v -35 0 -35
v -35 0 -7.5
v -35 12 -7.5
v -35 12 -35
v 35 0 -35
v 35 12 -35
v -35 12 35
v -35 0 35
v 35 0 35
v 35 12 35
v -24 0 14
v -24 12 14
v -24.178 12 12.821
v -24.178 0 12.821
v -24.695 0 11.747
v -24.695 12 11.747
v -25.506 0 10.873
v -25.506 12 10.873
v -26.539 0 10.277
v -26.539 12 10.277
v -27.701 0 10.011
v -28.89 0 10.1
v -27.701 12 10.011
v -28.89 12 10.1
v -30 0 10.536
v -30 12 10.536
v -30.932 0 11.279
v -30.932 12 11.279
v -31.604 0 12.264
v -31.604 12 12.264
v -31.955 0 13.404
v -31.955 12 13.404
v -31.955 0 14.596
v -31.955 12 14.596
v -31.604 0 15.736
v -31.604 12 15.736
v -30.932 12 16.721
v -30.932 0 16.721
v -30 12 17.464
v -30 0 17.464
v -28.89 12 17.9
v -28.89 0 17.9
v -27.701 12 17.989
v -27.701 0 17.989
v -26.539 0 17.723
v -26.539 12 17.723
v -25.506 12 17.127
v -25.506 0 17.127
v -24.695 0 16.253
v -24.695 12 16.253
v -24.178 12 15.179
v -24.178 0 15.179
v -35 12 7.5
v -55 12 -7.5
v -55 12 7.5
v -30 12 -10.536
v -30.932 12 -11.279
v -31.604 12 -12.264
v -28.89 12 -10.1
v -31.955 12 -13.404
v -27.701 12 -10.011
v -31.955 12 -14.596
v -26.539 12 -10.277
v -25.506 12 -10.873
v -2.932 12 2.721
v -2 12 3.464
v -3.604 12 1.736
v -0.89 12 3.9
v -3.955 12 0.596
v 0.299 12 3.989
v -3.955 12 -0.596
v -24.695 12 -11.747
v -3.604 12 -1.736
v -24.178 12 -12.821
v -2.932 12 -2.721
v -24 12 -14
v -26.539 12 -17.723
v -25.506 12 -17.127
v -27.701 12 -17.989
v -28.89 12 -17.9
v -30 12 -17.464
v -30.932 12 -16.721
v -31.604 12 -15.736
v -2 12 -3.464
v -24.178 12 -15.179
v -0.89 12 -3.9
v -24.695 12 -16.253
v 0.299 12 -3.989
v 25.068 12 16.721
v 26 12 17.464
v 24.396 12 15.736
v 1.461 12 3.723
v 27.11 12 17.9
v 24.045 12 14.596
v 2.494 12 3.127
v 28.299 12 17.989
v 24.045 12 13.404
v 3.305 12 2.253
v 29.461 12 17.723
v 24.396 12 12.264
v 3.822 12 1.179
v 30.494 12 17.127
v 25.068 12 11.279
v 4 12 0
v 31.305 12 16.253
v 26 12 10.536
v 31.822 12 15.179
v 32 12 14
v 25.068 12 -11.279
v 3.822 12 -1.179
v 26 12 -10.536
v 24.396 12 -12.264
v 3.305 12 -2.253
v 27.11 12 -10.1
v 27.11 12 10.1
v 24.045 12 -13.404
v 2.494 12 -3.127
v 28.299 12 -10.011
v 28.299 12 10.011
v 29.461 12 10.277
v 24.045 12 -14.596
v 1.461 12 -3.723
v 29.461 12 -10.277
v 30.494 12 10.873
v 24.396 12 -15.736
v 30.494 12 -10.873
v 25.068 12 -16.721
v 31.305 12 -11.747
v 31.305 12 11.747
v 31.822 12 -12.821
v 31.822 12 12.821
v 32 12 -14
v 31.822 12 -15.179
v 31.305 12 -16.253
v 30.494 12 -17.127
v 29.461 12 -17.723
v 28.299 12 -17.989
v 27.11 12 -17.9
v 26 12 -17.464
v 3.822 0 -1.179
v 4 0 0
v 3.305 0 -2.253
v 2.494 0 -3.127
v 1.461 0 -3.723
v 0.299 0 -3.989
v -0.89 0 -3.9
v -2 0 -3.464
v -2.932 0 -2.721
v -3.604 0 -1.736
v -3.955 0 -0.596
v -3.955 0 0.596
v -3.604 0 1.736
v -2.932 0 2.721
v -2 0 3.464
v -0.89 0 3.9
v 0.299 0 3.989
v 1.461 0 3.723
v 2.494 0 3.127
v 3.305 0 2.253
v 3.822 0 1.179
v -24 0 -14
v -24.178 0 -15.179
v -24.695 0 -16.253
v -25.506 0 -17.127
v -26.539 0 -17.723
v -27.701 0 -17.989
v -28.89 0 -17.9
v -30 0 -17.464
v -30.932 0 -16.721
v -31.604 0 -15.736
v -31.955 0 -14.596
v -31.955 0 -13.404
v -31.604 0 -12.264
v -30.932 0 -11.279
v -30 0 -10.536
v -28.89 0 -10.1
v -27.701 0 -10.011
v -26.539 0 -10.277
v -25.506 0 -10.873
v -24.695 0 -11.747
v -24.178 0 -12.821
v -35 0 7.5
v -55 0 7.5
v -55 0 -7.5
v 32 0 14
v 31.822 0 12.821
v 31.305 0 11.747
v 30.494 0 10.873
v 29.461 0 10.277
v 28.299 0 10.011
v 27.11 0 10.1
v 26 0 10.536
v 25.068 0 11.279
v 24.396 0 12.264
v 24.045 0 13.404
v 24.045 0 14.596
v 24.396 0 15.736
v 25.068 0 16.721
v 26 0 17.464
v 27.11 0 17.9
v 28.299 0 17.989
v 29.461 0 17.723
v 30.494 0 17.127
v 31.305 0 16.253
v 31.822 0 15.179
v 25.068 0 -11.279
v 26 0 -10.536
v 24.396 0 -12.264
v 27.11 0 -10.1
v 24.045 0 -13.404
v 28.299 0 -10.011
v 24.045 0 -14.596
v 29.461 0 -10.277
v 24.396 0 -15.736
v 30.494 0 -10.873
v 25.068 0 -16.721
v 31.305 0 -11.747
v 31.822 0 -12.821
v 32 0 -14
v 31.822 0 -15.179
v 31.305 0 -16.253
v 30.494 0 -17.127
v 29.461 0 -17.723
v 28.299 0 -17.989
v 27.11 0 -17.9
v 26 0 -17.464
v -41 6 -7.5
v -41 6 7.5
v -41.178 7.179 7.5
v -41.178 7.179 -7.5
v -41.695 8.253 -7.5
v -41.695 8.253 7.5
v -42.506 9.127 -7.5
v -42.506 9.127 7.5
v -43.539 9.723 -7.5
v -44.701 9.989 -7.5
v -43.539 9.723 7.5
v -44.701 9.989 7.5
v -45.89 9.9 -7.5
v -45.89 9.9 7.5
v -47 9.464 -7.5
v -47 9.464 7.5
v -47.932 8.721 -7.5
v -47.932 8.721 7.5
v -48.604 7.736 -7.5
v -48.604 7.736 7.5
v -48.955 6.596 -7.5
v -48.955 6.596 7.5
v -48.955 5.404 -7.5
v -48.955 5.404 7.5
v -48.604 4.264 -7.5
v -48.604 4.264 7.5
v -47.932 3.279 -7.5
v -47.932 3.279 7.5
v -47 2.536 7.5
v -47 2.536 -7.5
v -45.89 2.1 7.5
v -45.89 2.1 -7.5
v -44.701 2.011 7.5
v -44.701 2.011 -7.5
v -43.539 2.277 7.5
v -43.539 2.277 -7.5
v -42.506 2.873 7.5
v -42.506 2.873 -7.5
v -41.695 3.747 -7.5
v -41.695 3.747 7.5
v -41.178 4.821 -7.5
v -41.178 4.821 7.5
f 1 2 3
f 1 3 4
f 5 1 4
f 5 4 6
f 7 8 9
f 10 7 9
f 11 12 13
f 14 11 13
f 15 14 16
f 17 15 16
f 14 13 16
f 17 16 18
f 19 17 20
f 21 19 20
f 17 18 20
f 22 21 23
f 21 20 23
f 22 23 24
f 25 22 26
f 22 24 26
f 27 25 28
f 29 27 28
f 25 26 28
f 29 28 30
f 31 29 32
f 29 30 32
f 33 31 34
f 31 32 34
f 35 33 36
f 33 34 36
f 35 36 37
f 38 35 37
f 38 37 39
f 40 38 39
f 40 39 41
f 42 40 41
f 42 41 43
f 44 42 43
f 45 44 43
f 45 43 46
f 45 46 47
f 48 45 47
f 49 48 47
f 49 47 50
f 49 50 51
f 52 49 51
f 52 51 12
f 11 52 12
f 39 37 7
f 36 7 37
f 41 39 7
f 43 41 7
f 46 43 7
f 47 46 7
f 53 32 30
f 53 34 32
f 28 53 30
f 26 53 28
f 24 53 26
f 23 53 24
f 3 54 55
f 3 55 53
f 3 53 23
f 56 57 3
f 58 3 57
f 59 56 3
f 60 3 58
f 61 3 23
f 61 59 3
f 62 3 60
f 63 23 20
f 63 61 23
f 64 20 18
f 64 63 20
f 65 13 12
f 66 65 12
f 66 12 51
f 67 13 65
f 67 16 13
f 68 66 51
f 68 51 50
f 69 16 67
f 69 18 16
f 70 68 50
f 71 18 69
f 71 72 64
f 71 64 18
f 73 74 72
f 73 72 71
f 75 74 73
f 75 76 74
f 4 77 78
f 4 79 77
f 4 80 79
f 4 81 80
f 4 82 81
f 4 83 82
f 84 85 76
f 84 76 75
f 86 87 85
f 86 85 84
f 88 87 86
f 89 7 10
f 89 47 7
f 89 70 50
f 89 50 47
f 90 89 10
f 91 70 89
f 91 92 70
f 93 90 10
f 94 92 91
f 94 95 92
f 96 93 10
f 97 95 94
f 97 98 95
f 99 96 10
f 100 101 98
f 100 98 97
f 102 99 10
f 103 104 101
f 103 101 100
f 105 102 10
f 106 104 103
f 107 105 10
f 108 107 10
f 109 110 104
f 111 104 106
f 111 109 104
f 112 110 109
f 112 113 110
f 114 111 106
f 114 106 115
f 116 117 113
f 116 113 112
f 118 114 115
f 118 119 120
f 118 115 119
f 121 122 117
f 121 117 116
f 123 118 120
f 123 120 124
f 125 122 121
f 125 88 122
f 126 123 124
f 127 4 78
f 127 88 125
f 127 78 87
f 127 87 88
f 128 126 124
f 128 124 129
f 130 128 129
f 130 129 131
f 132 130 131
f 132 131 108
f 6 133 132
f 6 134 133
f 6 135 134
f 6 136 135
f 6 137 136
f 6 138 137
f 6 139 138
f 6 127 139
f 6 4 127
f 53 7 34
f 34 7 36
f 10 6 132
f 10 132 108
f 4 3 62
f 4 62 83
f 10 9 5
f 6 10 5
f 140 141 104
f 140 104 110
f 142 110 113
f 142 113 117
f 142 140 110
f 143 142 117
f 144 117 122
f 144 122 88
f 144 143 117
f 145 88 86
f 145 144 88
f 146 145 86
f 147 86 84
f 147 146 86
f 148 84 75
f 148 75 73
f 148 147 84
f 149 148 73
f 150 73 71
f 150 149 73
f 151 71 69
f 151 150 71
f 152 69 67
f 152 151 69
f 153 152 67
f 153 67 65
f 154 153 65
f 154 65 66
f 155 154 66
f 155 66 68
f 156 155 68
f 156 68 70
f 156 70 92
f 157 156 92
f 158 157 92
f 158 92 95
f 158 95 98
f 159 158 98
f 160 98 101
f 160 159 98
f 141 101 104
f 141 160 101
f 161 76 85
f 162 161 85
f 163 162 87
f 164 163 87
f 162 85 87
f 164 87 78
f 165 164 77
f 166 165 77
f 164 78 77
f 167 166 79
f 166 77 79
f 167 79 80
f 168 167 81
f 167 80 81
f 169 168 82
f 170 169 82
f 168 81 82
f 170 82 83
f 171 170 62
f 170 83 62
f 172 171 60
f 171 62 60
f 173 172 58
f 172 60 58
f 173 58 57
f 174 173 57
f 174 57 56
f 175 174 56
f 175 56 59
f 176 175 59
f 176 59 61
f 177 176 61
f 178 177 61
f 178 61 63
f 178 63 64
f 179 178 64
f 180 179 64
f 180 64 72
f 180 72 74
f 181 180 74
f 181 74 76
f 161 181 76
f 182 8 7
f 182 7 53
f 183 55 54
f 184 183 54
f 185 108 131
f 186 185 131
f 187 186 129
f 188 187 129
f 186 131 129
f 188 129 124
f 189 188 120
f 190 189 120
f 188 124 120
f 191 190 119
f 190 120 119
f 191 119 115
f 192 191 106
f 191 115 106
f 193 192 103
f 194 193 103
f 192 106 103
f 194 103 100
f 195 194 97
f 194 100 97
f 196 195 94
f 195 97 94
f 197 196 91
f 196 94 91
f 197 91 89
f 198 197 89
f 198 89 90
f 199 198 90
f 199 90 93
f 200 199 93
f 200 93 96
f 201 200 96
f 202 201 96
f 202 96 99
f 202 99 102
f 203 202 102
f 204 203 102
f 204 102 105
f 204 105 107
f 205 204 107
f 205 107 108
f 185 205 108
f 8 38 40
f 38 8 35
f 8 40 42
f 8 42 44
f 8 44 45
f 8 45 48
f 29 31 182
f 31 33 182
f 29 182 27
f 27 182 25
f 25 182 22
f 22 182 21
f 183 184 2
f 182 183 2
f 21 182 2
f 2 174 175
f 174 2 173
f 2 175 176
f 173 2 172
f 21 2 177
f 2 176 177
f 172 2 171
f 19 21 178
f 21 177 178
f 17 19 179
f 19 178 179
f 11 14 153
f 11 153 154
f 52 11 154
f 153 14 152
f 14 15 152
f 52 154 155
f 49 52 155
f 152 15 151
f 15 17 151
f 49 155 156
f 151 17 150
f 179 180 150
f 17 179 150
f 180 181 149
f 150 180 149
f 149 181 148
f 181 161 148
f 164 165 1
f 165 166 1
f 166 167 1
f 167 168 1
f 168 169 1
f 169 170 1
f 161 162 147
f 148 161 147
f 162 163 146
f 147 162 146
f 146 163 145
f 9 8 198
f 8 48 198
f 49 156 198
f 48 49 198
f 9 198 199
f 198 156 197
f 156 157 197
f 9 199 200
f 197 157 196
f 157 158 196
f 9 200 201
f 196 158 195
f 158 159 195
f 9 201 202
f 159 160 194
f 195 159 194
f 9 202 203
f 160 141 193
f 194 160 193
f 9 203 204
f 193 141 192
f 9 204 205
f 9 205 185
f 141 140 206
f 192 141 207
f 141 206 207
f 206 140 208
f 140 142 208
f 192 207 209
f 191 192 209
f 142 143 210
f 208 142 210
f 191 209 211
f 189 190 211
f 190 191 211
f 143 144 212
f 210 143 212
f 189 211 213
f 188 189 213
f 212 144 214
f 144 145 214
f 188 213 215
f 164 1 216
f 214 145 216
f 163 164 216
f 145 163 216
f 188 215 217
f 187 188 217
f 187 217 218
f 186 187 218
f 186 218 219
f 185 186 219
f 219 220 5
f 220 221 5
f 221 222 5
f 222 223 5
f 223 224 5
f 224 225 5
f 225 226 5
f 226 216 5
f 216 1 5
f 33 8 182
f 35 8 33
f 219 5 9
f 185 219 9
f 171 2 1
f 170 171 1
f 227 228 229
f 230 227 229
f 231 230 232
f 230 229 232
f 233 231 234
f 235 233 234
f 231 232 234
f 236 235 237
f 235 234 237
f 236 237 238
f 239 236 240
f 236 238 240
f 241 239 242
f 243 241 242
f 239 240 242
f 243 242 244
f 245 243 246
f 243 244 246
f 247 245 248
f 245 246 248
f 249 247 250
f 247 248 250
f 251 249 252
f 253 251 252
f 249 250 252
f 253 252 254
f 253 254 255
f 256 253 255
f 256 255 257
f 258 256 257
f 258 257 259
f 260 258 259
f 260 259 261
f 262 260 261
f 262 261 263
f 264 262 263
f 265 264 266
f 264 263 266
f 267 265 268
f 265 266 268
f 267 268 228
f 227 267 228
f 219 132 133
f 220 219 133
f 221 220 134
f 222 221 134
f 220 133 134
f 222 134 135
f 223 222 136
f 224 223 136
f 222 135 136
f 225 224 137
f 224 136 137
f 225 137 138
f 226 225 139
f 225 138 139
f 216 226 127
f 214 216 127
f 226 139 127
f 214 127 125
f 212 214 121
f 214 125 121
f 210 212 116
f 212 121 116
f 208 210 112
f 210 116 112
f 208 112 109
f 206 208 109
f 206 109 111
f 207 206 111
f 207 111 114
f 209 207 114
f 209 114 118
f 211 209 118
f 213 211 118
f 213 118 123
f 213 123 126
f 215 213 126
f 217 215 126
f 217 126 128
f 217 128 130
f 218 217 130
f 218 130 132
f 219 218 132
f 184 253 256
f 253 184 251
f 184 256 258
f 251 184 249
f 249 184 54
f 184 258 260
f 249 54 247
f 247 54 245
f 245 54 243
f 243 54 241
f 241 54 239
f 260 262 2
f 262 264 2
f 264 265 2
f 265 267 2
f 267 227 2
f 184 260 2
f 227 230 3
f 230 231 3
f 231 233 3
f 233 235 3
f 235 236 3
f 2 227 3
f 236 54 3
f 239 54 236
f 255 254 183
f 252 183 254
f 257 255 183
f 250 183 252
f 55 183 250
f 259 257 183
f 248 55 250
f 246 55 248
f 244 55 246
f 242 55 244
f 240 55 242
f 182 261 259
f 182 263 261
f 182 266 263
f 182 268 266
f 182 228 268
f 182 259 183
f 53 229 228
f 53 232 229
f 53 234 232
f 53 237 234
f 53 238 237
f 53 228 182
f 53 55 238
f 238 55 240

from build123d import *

# Parameters (mm, degrees)
CROQUIS1_W              = 70
CROQUIS1_H              = 70
CROQUIS1_R              = 4
SALIENTE_EXTRUIR1_DEPTH = 12
CROQUIS3_R              = 4
CORTAR_EXTRUIR2_DEPTH   = 15
CROQUIS4_W              = 40
CROQUIS4_H              = 15
SALIENTE_EXTRUIR2_DEPTH = 12
CROQUIS6_R              = 4
CORTAR_EXTRUIR4_DEPTH   = 15


with BuildPart() as part:
    # Croquis1 → Saliente-Extruir1 (new body)
    with BuildSketch(Plane(origin=(0, 0, 0), x_dir=(1, 0, 0), z_dir=(0, 1, 0))):
        Rectangle(CROQUIS1_W, CROQUIS1_H)
        Circle(CROQUIS1_R, mode=Mode.SUBTRACT)
    extrude(amount=SALIENTE_EXTRUIR1_DEPTH)

    # Croquis3 → Cortar-Extruir2 (cut)
    with BuildSketch(Plane(origin=(0, 12, 0), x_dir=(1, 0, 0), z_dir=(0, 1, 0))):
        with Locations((-28, 14)):
            Circle(CROQUIS3_R)
        with Locations((28, 14)):
            Circle(CROQUIS3_R)
        with Locations((28, -14)):
            Circle(CROQUIS3_R)
        with Locations((-28, -14)):
            Circle(CROQUIS3_R)
    extrude(amount=-CORTAR_EXTRUIR2_DEPTH, mode=Mode.SUBTRACT)

    # Croquis4 → Saliente-Extruir2 (add)
    with BuildSketch(Plane(origin=(0, 12, 0), x_dir=(1, 0, 0), z_dir=(0, 1, 0))):
        with Locations((-35, 0)):
            Rectangle(CROQUIS4_W, CROQUIS4_H)
    extrude(amount=-SALIENTE_EXTRUIR2_DEPTH)

    # Croquis6 → Cortar-Extruir4 (cut)
    with BuildSketch(Plane.XY.offset(7.5)):
        with Locations((-45, 6)):
            Circle(CROQUIS6_R)
    extrude(amount=-CORTAR_EXTRUIR4_DEPTH, mode=Mode.SUBTRACT)


solid = part.part
